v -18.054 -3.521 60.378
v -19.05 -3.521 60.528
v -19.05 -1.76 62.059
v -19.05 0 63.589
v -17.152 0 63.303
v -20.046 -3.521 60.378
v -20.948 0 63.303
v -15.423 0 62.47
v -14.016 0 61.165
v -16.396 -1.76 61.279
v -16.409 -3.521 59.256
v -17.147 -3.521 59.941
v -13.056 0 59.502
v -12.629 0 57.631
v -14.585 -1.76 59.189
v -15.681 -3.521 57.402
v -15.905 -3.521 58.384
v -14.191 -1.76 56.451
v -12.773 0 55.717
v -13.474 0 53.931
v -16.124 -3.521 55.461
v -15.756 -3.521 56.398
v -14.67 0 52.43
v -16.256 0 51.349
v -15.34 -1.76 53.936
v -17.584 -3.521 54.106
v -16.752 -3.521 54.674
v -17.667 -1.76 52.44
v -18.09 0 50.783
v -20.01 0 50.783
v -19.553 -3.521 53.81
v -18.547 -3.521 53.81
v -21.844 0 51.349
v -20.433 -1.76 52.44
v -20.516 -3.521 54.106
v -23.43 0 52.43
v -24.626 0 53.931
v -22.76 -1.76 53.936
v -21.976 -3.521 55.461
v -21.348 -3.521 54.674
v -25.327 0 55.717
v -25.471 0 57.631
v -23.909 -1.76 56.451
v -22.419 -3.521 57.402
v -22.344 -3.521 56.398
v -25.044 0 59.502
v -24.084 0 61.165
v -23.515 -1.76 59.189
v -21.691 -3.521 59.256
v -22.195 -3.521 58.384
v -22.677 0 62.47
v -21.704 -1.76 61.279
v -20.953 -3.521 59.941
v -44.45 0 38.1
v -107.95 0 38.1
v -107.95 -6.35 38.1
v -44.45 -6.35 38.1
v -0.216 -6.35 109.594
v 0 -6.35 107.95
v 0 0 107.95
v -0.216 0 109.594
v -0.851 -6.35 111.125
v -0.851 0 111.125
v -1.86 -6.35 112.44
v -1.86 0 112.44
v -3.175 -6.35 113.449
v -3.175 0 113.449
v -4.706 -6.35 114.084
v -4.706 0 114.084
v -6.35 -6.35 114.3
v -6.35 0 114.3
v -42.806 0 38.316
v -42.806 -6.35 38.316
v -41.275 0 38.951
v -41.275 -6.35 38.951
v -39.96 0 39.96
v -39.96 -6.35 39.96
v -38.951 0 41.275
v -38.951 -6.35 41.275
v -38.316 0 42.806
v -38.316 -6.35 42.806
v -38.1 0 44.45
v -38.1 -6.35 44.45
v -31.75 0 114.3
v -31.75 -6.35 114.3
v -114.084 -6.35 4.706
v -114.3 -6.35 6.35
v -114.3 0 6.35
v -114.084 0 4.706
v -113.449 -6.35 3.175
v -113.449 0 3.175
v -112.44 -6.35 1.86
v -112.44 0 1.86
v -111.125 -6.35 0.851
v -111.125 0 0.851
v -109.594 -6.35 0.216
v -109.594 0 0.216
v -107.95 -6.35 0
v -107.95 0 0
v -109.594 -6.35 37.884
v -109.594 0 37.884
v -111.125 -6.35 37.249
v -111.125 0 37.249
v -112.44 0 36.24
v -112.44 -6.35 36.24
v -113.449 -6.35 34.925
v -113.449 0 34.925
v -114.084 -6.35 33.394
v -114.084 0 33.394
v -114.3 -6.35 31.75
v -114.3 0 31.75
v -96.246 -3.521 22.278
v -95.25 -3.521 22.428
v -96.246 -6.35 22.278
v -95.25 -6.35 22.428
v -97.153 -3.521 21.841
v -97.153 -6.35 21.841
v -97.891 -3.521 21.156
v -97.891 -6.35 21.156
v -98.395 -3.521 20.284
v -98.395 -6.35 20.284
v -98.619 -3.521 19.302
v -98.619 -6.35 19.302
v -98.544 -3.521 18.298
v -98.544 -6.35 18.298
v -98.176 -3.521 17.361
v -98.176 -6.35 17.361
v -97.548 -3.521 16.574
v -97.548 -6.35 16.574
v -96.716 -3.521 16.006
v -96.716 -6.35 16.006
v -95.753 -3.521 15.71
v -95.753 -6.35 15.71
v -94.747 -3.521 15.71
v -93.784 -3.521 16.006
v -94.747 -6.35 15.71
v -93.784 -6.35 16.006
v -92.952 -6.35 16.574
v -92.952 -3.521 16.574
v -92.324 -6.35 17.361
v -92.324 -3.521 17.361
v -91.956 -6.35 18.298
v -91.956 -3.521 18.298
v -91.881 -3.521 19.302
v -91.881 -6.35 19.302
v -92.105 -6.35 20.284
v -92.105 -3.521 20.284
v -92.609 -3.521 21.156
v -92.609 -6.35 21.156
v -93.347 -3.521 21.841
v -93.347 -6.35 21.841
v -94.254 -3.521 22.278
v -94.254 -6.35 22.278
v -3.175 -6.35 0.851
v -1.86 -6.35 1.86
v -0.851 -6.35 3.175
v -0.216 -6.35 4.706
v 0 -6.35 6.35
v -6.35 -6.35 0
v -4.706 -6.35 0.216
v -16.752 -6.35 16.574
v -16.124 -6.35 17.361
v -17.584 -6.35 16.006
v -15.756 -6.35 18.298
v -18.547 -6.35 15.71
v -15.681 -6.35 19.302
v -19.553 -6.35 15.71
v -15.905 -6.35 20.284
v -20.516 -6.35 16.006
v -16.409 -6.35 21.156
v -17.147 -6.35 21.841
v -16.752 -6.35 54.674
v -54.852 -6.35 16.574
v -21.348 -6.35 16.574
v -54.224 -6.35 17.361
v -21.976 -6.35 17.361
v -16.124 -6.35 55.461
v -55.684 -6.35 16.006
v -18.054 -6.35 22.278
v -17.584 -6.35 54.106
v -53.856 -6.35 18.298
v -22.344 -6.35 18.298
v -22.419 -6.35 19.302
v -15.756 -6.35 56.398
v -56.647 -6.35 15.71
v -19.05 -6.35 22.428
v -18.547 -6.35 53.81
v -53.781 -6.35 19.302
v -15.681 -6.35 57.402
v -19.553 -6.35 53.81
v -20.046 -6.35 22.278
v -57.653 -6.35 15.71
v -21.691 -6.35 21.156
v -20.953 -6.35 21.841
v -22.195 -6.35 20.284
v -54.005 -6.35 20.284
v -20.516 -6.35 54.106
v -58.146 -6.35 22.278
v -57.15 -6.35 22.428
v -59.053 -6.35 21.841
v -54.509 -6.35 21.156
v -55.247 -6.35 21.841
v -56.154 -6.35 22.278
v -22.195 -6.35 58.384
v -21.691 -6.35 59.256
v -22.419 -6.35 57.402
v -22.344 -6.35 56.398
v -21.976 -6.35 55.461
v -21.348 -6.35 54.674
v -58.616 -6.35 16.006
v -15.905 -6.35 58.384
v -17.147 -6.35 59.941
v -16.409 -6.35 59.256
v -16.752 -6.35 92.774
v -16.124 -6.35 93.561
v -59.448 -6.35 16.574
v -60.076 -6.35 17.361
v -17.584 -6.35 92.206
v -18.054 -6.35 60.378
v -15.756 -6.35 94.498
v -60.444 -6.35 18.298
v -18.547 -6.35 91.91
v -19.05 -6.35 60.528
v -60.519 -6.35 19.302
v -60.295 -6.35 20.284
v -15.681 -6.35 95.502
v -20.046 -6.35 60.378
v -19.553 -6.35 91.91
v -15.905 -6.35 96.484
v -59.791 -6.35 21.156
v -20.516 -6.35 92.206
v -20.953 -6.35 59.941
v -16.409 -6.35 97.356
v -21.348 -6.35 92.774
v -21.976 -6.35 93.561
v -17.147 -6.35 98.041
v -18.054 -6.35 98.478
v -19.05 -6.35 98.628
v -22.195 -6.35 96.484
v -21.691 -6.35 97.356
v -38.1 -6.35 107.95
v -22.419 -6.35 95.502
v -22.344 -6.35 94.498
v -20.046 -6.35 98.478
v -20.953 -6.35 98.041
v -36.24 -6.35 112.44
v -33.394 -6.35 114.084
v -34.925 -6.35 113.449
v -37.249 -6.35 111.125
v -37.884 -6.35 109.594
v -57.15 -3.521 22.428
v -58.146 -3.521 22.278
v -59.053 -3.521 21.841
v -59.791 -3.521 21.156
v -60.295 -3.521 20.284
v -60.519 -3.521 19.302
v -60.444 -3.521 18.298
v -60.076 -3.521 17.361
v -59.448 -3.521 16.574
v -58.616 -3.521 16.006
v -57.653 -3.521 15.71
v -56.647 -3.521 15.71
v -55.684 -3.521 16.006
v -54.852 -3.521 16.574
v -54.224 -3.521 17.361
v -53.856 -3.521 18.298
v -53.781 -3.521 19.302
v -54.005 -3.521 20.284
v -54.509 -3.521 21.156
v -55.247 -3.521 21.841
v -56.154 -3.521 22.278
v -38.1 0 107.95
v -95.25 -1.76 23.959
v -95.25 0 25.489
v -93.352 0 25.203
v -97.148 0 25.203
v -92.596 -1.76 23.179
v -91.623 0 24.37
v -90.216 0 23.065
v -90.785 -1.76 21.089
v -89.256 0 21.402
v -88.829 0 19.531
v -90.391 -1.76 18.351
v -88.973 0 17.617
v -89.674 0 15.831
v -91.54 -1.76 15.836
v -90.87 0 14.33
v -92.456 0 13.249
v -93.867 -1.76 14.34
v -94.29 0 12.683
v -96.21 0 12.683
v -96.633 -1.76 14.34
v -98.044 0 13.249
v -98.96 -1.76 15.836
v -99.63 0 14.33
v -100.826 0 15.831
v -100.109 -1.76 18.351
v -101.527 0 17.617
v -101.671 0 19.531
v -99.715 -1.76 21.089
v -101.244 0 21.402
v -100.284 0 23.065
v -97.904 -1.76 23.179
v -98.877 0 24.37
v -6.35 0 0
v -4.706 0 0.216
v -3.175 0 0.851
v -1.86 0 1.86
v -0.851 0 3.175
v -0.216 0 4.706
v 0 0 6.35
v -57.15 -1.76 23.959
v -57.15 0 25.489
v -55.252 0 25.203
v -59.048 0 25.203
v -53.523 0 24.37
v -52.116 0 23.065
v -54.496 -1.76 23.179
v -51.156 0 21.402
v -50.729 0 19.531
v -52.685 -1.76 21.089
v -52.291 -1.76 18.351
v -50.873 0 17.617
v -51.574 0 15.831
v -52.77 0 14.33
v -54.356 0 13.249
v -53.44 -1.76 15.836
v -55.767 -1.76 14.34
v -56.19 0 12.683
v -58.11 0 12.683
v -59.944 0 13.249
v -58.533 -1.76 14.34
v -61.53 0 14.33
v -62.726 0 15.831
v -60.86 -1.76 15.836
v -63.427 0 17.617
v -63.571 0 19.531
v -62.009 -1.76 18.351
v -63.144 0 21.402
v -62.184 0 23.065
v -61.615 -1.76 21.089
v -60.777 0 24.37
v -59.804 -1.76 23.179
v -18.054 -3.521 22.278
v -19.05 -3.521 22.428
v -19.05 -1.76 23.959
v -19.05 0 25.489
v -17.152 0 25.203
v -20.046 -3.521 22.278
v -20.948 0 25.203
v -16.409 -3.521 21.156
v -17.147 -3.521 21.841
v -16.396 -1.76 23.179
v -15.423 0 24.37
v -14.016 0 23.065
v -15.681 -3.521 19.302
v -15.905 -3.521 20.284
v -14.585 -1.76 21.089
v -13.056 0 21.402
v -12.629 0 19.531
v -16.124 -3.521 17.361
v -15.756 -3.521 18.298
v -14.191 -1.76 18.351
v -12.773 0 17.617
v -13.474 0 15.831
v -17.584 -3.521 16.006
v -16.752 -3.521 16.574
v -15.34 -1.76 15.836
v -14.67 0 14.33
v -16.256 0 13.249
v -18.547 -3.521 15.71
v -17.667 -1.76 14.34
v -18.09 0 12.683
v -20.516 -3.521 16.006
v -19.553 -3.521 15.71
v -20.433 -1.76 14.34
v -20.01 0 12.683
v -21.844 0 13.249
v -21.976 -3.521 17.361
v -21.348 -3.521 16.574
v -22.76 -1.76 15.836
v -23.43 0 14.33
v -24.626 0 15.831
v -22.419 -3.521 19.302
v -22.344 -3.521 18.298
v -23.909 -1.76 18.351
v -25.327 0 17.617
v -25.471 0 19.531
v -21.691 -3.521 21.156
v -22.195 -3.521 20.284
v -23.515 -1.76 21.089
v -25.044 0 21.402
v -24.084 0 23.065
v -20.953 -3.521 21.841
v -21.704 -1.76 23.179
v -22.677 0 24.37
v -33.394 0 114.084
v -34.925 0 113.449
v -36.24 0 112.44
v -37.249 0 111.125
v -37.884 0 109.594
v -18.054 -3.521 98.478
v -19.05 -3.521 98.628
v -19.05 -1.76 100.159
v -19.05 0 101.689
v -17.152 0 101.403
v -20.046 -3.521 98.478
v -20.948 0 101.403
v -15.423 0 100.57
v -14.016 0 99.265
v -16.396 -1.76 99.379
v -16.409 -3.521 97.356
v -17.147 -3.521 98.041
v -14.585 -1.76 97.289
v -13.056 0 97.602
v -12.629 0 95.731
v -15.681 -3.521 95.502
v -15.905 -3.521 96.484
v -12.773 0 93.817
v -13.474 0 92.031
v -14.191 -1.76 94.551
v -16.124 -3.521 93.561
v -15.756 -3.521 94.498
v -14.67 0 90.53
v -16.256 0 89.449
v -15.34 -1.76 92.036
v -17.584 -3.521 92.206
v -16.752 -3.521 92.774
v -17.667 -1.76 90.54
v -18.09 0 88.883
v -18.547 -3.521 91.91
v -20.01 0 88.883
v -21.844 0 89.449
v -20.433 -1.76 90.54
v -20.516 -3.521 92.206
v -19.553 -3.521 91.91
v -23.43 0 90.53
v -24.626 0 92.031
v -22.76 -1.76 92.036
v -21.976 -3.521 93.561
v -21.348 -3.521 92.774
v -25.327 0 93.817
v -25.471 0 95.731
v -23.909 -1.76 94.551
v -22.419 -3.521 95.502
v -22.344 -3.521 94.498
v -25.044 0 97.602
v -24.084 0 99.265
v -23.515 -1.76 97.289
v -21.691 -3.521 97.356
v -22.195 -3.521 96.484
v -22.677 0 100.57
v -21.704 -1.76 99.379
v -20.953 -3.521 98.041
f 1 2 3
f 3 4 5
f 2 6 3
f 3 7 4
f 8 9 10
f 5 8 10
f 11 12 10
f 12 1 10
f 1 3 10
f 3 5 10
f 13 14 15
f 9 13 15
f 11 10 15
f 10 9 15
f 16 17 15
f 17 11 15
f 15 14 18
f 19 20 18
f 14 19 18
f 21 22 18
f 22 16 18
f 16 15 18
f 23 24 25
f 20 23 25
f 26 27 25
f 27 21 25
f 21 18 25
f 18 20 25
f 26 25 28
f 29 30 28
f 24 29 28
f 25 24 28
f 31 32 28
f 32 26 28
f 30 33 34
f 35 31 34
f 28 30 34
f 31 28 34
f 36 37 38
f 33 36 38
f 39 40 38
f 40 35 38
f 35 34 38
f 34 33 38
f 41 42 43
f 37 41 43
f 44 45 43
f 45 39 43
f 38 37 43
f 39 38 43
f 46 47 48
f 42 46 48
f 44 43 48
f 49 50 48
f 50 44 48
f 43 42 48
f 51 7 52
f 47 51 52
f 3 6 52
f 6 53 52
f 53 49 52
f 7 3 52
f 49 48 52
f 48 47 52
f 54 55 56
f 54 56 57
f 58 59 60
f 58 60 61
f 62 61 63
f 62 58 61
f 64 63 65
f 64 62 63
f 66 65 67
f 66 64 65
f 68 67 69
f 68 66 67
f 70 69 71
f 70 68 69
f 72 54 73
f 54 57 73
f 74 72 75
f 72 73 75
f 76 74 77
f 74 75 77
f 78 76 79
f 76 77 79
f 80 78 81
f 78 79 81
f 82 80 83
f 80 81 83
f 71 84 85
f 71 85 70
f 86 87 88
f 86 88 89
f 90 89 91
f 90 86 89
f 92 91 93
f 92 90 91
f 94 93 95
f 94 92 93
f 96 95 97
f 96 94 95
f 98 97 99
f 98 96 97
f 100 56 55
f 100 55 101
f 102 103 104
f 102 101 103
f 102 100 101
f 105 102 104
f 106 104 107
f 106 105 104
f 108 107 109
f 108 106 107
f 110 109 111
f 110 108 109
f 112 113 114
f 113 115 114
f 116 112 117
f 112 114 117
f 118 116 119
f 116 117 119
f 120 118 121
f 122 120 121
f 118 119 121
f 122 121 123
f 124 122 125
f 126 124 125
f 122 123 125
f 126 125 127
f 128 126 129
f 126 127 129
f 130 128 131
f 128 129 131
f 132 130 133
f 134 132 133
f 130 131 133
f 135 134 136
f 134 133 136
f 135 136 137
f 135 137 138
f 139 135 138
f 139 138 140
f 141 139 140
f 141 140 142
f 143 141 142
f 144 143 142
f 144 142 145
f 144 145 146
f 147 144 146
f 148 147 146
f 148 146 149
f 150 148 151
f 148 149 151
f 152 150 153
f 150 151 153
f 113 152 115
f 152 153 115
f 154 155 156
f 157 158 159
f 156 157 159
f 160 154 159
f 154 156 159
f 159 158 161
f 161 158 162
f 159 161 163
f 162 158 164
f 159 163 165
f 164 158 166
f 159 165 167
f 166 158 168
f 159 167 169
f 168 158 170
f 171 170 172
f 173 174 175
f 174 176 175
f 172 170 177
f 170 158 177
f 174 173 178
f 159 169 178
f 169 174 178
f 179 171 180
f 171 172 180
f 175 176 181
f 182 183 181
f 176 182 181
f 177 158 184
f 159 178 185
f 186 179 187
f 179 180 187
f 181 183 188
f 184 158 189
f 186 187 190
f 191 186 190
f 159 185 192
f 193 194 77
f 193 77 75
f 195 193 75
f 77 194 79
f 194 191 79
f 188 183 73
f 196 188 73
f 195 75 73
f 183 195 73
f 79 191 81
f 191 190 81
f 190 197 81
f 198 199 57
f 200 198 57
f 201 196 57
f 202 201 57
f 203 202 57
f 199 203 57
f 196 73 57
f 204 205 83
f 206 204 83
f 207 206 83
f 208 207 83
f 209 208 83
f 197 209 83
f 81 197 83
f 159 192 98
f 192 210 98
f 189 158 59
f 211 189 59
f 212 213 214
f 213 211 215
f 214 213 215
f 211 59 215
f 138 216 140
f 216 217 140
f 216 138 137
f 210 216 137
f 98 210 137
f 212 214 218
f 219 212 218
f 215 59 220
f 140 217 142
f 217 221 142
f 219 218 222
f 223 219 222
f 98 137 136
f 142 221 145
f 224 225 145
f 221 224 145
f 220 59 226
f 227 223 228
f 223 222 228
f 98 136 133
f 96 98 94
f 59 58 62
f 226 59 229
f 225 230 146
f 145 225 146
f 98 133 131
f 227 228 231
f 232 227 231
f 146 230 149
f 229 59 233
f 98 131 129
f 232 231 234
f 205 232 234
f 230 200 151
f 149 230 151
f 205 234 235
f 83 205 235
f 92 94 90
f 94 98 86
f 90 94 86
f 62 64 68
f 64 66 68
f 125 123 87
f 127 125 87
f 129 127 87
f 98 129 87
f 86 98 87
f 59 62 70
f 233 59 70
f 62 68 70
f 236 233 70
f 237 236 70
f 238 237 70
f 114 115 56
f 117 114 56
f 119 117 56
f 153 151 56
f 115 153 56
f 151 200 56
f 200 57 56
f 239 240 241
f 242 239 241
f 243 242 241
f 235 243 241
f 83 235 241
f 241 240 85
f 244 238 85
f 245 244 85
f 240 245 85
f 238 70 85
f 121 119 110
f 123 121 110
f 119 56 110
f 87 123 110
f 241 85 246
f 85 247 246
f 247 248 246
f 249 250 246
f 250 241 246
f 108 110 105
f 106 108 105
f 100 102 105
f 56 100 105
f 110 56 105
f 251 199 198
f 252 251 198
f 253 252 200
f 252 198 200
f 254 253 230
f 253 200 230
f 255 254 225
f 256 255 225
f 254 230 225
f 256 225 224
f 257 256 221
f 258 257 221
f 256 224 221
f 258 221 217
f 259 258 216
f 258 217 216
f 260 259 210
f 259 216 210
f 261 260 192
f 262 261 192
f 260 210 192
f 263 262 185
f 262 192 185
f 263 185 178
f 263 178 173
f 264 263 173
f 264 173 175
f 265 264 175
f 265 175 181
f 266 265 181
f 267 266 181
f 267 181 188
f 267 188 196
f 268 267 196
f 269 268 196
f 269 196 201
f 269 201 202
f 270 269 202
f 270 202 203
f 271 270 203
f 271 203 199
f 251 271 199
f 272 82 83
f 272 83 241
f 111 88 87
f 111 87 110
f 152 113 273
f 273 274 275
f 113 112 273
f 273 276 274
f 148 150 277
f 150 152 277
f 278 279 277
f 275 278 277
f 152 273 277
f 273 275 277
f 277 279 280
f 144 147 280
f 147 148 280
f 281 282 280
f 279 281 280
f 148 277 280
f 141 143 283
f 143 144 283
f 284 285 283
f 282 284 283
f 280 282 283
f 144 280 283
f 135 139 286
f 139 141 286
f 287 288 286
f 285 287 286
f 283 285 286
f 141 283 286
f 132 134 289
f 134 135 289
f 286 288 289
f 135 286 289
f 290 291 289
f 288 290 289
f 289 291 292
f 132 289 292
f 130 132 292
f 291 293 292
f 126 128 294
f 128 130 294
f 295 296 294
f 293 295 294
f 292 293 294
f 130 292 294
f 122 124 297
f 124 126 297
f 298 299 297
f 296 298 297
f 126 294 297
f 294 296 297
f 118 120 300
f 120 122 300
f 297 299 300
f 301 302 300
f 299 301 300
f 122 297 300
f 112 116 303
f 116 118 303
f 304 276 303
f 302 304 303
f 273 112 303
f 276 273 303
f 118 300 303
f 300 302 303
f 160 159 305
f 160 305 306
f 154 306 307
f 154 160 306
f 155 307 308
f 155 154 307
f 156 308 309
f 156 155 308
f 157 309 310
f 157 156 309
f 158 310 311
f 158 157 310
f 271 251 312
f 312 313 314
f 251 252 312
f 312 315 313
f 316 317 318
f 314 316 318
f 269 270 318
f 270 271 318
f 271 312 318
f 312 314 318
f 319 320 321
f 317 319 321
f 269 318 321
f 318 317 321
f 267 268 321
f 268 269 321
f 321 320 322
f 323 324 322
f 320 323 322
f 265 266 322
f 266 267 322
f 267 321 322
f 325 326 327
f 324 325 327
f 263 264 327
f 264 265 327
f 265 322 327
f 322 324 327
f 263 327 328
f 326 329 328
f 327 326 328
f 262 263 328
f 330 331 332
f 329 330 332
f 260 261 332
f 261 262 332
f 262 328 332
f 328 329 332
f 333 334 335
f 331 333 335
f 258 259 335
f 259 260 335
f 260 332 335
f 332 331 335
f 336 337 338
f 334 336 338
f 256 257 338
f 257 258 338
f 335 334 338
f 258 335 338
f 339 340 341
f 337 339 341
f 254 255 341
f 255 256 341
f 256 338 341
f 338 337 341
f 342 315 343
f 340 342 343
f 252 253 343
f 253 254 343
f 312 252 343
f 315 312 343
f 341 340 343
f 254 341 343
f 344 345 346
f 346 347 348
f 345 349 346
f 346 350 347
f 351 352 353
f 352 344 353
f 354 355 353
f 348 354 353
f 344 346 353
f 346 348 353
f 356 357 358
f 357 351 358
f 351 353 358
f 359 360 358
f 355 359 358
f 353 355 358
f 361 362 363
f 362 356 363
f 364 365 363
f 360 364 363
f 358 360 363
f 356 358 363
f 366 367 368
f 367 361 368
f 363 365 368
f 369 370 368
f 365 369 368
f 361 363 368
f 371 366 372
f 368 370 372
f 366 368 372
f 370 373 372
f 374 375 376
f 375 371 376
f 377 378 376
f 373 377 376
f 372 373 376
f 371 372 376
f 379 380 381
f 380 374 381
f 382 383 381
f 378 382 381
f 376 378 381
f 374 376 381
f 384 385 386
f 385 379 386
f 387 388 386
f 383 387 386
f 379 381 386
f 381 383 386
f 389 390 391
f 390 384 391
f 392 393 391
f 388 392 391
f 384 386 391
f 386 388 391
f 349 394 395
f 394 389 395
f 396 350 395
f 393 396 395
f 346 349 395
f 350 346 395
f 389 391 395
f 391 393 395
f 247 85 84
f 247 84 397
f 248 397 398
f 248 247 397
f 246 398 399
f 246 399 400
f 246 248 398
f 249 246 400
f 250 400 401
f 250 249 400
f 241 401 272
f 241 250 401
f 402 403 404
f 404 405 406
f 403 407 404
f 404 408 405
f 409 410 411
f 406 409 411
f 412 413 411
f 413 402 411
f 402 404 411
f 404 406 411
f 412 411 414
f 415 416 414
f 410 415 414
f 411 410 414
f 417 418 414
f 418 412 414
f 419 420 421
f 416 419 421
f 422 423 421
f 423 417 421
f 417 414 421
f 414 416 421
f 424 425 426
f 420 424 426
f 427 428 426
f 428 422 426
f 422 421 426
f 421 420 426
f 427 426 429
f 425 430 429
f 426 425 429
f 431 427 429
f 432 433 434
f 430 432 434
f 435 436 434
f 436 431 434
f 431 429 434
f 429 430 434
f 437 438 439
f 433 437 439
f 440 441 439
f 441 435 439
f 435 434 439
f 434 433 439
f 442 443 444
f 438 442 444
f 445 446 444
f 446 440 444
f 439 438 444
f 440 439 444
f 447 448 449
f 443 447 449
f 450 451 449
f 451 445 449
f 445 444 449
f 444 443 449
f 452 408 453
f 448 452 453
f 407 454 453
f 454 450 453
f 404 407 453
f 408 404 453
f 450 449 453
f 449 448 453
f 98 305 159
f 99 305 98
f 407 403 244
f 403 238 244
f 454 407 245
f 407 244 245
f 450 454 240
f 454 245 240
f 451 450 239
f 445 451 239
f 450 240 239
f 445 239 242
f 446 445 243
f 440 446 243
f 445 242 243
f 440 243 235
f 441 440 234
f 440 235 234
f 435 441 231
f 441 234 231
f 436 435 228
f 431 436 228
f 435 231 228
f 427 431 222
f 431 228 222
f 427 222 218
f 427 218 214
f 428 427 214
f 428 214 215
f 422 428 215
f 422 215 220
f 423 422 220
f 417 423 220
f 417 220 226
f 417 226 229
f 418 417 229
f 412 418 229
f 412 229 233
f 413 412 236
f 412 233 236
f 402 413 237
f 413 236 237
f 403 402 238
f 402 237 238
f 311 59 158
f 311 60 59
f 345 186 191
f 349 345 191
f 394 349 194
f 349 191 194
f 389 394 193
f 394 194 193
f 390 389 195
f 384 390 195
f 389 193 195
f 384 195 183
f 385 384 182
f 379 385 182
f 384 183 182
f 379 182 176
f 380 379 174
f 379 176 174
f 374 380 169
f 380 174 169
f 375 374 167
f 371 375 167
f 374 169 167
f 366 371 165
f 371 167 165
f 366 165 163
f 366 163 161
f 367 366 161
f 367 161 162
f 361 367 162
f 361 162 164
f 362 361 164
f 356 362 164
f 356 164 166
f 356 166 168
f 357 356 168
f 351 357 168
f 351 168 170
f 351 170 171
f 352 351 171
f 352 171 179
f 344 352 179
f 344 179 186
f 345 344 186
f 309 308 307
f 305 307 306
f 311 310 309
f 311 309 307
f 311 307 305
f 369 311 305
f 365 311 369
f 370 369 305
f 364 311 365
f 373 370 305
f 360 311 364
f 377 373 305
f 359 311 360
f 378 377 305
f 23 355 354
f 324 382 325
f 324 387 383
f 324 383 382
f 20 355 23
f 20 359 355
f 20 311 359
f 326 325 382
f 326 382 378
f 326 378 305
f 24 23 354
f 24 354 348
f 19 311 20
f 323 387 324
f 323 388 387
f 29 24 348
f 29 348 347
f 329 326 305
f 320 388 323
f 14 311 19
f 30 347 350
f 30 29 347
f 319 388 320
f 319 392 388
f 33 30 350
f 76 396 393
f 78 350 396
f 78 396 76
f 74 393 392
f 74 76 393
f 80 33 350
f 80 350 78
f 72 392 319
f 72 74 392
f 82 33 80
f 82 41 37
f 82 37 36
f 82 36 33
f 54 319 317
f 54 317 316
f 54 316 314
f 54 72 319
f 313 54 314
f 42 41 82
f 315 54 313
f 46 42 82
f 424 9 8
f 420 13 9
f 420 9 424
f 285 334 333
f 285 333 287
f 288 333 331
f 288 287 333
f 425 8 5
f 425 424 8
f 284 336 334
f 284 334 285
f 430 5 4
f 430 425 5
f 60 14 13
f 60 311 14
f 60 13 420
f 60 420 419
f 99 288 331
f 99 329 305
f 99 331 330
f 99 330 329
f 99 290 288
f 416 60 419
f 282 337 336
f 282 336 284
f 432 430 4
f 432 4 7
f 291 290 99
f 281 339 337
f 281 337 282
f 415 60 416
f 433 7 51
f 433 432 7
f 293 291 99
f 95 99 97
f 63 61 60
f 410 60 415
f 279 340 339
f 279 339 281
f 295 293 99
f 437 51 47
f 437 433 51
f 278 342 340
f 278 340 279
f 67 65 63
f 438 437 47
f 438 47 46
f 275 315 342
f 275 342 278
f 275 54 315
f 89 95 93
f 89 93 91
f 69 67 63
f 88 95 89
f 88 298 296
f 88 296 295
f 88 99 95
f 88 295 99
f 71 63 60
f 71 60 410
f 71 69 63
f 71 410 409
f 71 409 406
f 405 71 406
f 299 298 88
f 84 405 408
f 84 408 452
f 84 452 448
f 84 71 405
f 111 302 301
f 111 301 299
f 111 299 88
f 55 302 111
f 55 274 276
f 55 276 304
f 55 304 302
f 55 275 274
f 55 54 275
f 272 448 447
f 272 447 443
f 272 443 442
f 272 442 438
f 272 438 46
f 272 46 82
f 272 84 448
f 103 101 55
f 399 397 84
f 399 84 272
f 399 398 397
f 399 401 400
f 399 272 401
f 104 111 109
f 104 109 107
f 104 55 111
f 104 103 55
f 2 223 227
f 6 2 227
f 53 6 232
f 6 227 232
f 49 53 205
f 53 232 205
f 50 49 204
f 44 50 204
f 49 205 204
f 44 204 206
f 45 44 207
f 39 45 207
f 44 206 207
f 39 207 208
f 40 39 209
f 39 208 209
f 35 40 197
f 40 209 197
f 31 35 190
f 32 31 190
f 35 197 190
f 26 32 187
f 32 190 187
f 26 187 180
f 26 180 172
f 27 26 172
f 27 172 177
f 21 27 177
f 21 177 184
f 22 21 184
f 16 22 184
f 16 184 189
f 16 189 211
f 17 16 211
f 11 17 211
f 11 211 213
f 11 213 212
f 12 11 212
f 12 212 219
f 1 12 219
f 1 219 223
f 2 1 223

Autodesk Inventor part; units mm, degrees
ref_plane "YZ Plane" through (0, 0, 0) normal (1, 0, 0) x (0, 1, 0)
ref_plane "XZ Plane" through (0, 0, 0) normal (0, 1, 0) x (-1, 0, 0)
ref_plane "XY Plane" through (0, 0, 0) normal (0, 0, 1) x (1, 0, 0)
sketch "Sketch1" plane through (0, 0, 0) normal (0, 1, 0) x (-1, 0, 0)
  line L0 (0, 0) -> (19.05, 0)
  line L1 (38.1, 38.1) -> (38.1, 114.3)
  line L2 (38.1, 114.3) -> (0, 114.3)
  line L3 (0, 114.3) -> (0, 0)
  line L4 (0, 0) -> (114.3, 0)
  line L5 (114.3, 0) -> (114.3, 38.1)
  line L6 (114.3, 38.1) -> (38.1, 38.1)
  line L7 (0, 38.1) -> (0, 0)
  line L8 (19.05, 114.3) -> (19.05, 19.05) construction
  line L9 (19.05, 19.05) -> (114.3, 19.05) construction
  point P0 (19.05, 95.25)
  point P1 (19.05, 57.15)
  point P2 (57.15, 19.05)
  point P3 (95.25, 19.05)
  dimension "d3" = 38.1
  dimension "d4" = 114.3
  dimension "d5" = 114.3
  dimension "d6" = 38.1
  dimension "d9" = 19.05
  dimension "d10" = 19.05
  dimension "d11" = 19.05
  dimension "d12" = 57.15
  dimension "d13" = 19.05
  dimension "d14" = 57.15
extrude "Extrusion1" add sketch "Sketch1" against normal blind 6.35
hole "Hole1" at (-19.05, 0, 95.25) at (-19.05, 0, 57.15) at (-57.15, 0, 19.05) at (-95.25, 0, 19.05) at (-19.05, 0, 19.05) direction (0, -1, 0) diameter 6.7564 end through all countersink diameter 12.8778 countersink angle 82 clearance for "Flat Head Machine Screw (82)" size "1/4" standard "Ansi Unified Screw Threads"
fillet "Fillet1" radius 6.35 6 edges at (0, -3.175, 114.3) (0, -3.175, 0) (-38.1, -3.175, 114.3) (-38.1, -3.175, 38.1) (-114.3, -3.175, 0) (-114.3, -3.175, 38.1)
equation "\"d3\" = d6"
equation "\"d4\" = d5"
equation "\"d9\" = d10"
equation "\"d11\" = d13"
equation "\"d12\" = d14"
properties part number "angle-90-plate" material "Aluminum 6061"
